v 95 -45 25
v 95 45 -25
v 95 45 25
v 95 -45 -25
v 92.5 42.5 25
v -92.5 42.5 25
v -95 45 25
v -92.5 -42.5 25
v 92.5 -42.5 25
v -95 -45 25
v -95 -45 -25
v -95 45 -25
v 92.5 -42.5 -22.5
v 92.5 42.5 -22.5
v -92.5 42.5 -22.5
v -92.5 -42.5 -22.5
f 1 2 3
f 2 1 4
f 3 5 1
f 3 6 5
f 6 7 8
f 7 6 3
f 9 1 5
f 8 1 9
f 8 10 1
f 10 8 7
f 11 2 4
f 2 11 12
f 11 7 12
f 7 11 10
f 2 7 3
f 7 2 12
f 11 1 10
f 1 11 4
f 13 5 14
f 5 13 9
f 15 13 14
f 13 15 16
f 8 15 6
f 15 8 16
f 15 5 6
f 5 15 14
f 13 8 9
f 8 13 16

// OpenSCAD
// ========================================
// a 190 x 90 x 50 mm enclosure with 2.5 mm wall thickness
// NeuroCAD canonical IR; dimensions are millimetres
// ========================================
$fn = 48;

difference() {
  cube(size=[190, 90, 50], center=true);
  translate([0, 0, 1.35]) {
    cube(size=[185, 85, 47.7], center=true);
  }
}
